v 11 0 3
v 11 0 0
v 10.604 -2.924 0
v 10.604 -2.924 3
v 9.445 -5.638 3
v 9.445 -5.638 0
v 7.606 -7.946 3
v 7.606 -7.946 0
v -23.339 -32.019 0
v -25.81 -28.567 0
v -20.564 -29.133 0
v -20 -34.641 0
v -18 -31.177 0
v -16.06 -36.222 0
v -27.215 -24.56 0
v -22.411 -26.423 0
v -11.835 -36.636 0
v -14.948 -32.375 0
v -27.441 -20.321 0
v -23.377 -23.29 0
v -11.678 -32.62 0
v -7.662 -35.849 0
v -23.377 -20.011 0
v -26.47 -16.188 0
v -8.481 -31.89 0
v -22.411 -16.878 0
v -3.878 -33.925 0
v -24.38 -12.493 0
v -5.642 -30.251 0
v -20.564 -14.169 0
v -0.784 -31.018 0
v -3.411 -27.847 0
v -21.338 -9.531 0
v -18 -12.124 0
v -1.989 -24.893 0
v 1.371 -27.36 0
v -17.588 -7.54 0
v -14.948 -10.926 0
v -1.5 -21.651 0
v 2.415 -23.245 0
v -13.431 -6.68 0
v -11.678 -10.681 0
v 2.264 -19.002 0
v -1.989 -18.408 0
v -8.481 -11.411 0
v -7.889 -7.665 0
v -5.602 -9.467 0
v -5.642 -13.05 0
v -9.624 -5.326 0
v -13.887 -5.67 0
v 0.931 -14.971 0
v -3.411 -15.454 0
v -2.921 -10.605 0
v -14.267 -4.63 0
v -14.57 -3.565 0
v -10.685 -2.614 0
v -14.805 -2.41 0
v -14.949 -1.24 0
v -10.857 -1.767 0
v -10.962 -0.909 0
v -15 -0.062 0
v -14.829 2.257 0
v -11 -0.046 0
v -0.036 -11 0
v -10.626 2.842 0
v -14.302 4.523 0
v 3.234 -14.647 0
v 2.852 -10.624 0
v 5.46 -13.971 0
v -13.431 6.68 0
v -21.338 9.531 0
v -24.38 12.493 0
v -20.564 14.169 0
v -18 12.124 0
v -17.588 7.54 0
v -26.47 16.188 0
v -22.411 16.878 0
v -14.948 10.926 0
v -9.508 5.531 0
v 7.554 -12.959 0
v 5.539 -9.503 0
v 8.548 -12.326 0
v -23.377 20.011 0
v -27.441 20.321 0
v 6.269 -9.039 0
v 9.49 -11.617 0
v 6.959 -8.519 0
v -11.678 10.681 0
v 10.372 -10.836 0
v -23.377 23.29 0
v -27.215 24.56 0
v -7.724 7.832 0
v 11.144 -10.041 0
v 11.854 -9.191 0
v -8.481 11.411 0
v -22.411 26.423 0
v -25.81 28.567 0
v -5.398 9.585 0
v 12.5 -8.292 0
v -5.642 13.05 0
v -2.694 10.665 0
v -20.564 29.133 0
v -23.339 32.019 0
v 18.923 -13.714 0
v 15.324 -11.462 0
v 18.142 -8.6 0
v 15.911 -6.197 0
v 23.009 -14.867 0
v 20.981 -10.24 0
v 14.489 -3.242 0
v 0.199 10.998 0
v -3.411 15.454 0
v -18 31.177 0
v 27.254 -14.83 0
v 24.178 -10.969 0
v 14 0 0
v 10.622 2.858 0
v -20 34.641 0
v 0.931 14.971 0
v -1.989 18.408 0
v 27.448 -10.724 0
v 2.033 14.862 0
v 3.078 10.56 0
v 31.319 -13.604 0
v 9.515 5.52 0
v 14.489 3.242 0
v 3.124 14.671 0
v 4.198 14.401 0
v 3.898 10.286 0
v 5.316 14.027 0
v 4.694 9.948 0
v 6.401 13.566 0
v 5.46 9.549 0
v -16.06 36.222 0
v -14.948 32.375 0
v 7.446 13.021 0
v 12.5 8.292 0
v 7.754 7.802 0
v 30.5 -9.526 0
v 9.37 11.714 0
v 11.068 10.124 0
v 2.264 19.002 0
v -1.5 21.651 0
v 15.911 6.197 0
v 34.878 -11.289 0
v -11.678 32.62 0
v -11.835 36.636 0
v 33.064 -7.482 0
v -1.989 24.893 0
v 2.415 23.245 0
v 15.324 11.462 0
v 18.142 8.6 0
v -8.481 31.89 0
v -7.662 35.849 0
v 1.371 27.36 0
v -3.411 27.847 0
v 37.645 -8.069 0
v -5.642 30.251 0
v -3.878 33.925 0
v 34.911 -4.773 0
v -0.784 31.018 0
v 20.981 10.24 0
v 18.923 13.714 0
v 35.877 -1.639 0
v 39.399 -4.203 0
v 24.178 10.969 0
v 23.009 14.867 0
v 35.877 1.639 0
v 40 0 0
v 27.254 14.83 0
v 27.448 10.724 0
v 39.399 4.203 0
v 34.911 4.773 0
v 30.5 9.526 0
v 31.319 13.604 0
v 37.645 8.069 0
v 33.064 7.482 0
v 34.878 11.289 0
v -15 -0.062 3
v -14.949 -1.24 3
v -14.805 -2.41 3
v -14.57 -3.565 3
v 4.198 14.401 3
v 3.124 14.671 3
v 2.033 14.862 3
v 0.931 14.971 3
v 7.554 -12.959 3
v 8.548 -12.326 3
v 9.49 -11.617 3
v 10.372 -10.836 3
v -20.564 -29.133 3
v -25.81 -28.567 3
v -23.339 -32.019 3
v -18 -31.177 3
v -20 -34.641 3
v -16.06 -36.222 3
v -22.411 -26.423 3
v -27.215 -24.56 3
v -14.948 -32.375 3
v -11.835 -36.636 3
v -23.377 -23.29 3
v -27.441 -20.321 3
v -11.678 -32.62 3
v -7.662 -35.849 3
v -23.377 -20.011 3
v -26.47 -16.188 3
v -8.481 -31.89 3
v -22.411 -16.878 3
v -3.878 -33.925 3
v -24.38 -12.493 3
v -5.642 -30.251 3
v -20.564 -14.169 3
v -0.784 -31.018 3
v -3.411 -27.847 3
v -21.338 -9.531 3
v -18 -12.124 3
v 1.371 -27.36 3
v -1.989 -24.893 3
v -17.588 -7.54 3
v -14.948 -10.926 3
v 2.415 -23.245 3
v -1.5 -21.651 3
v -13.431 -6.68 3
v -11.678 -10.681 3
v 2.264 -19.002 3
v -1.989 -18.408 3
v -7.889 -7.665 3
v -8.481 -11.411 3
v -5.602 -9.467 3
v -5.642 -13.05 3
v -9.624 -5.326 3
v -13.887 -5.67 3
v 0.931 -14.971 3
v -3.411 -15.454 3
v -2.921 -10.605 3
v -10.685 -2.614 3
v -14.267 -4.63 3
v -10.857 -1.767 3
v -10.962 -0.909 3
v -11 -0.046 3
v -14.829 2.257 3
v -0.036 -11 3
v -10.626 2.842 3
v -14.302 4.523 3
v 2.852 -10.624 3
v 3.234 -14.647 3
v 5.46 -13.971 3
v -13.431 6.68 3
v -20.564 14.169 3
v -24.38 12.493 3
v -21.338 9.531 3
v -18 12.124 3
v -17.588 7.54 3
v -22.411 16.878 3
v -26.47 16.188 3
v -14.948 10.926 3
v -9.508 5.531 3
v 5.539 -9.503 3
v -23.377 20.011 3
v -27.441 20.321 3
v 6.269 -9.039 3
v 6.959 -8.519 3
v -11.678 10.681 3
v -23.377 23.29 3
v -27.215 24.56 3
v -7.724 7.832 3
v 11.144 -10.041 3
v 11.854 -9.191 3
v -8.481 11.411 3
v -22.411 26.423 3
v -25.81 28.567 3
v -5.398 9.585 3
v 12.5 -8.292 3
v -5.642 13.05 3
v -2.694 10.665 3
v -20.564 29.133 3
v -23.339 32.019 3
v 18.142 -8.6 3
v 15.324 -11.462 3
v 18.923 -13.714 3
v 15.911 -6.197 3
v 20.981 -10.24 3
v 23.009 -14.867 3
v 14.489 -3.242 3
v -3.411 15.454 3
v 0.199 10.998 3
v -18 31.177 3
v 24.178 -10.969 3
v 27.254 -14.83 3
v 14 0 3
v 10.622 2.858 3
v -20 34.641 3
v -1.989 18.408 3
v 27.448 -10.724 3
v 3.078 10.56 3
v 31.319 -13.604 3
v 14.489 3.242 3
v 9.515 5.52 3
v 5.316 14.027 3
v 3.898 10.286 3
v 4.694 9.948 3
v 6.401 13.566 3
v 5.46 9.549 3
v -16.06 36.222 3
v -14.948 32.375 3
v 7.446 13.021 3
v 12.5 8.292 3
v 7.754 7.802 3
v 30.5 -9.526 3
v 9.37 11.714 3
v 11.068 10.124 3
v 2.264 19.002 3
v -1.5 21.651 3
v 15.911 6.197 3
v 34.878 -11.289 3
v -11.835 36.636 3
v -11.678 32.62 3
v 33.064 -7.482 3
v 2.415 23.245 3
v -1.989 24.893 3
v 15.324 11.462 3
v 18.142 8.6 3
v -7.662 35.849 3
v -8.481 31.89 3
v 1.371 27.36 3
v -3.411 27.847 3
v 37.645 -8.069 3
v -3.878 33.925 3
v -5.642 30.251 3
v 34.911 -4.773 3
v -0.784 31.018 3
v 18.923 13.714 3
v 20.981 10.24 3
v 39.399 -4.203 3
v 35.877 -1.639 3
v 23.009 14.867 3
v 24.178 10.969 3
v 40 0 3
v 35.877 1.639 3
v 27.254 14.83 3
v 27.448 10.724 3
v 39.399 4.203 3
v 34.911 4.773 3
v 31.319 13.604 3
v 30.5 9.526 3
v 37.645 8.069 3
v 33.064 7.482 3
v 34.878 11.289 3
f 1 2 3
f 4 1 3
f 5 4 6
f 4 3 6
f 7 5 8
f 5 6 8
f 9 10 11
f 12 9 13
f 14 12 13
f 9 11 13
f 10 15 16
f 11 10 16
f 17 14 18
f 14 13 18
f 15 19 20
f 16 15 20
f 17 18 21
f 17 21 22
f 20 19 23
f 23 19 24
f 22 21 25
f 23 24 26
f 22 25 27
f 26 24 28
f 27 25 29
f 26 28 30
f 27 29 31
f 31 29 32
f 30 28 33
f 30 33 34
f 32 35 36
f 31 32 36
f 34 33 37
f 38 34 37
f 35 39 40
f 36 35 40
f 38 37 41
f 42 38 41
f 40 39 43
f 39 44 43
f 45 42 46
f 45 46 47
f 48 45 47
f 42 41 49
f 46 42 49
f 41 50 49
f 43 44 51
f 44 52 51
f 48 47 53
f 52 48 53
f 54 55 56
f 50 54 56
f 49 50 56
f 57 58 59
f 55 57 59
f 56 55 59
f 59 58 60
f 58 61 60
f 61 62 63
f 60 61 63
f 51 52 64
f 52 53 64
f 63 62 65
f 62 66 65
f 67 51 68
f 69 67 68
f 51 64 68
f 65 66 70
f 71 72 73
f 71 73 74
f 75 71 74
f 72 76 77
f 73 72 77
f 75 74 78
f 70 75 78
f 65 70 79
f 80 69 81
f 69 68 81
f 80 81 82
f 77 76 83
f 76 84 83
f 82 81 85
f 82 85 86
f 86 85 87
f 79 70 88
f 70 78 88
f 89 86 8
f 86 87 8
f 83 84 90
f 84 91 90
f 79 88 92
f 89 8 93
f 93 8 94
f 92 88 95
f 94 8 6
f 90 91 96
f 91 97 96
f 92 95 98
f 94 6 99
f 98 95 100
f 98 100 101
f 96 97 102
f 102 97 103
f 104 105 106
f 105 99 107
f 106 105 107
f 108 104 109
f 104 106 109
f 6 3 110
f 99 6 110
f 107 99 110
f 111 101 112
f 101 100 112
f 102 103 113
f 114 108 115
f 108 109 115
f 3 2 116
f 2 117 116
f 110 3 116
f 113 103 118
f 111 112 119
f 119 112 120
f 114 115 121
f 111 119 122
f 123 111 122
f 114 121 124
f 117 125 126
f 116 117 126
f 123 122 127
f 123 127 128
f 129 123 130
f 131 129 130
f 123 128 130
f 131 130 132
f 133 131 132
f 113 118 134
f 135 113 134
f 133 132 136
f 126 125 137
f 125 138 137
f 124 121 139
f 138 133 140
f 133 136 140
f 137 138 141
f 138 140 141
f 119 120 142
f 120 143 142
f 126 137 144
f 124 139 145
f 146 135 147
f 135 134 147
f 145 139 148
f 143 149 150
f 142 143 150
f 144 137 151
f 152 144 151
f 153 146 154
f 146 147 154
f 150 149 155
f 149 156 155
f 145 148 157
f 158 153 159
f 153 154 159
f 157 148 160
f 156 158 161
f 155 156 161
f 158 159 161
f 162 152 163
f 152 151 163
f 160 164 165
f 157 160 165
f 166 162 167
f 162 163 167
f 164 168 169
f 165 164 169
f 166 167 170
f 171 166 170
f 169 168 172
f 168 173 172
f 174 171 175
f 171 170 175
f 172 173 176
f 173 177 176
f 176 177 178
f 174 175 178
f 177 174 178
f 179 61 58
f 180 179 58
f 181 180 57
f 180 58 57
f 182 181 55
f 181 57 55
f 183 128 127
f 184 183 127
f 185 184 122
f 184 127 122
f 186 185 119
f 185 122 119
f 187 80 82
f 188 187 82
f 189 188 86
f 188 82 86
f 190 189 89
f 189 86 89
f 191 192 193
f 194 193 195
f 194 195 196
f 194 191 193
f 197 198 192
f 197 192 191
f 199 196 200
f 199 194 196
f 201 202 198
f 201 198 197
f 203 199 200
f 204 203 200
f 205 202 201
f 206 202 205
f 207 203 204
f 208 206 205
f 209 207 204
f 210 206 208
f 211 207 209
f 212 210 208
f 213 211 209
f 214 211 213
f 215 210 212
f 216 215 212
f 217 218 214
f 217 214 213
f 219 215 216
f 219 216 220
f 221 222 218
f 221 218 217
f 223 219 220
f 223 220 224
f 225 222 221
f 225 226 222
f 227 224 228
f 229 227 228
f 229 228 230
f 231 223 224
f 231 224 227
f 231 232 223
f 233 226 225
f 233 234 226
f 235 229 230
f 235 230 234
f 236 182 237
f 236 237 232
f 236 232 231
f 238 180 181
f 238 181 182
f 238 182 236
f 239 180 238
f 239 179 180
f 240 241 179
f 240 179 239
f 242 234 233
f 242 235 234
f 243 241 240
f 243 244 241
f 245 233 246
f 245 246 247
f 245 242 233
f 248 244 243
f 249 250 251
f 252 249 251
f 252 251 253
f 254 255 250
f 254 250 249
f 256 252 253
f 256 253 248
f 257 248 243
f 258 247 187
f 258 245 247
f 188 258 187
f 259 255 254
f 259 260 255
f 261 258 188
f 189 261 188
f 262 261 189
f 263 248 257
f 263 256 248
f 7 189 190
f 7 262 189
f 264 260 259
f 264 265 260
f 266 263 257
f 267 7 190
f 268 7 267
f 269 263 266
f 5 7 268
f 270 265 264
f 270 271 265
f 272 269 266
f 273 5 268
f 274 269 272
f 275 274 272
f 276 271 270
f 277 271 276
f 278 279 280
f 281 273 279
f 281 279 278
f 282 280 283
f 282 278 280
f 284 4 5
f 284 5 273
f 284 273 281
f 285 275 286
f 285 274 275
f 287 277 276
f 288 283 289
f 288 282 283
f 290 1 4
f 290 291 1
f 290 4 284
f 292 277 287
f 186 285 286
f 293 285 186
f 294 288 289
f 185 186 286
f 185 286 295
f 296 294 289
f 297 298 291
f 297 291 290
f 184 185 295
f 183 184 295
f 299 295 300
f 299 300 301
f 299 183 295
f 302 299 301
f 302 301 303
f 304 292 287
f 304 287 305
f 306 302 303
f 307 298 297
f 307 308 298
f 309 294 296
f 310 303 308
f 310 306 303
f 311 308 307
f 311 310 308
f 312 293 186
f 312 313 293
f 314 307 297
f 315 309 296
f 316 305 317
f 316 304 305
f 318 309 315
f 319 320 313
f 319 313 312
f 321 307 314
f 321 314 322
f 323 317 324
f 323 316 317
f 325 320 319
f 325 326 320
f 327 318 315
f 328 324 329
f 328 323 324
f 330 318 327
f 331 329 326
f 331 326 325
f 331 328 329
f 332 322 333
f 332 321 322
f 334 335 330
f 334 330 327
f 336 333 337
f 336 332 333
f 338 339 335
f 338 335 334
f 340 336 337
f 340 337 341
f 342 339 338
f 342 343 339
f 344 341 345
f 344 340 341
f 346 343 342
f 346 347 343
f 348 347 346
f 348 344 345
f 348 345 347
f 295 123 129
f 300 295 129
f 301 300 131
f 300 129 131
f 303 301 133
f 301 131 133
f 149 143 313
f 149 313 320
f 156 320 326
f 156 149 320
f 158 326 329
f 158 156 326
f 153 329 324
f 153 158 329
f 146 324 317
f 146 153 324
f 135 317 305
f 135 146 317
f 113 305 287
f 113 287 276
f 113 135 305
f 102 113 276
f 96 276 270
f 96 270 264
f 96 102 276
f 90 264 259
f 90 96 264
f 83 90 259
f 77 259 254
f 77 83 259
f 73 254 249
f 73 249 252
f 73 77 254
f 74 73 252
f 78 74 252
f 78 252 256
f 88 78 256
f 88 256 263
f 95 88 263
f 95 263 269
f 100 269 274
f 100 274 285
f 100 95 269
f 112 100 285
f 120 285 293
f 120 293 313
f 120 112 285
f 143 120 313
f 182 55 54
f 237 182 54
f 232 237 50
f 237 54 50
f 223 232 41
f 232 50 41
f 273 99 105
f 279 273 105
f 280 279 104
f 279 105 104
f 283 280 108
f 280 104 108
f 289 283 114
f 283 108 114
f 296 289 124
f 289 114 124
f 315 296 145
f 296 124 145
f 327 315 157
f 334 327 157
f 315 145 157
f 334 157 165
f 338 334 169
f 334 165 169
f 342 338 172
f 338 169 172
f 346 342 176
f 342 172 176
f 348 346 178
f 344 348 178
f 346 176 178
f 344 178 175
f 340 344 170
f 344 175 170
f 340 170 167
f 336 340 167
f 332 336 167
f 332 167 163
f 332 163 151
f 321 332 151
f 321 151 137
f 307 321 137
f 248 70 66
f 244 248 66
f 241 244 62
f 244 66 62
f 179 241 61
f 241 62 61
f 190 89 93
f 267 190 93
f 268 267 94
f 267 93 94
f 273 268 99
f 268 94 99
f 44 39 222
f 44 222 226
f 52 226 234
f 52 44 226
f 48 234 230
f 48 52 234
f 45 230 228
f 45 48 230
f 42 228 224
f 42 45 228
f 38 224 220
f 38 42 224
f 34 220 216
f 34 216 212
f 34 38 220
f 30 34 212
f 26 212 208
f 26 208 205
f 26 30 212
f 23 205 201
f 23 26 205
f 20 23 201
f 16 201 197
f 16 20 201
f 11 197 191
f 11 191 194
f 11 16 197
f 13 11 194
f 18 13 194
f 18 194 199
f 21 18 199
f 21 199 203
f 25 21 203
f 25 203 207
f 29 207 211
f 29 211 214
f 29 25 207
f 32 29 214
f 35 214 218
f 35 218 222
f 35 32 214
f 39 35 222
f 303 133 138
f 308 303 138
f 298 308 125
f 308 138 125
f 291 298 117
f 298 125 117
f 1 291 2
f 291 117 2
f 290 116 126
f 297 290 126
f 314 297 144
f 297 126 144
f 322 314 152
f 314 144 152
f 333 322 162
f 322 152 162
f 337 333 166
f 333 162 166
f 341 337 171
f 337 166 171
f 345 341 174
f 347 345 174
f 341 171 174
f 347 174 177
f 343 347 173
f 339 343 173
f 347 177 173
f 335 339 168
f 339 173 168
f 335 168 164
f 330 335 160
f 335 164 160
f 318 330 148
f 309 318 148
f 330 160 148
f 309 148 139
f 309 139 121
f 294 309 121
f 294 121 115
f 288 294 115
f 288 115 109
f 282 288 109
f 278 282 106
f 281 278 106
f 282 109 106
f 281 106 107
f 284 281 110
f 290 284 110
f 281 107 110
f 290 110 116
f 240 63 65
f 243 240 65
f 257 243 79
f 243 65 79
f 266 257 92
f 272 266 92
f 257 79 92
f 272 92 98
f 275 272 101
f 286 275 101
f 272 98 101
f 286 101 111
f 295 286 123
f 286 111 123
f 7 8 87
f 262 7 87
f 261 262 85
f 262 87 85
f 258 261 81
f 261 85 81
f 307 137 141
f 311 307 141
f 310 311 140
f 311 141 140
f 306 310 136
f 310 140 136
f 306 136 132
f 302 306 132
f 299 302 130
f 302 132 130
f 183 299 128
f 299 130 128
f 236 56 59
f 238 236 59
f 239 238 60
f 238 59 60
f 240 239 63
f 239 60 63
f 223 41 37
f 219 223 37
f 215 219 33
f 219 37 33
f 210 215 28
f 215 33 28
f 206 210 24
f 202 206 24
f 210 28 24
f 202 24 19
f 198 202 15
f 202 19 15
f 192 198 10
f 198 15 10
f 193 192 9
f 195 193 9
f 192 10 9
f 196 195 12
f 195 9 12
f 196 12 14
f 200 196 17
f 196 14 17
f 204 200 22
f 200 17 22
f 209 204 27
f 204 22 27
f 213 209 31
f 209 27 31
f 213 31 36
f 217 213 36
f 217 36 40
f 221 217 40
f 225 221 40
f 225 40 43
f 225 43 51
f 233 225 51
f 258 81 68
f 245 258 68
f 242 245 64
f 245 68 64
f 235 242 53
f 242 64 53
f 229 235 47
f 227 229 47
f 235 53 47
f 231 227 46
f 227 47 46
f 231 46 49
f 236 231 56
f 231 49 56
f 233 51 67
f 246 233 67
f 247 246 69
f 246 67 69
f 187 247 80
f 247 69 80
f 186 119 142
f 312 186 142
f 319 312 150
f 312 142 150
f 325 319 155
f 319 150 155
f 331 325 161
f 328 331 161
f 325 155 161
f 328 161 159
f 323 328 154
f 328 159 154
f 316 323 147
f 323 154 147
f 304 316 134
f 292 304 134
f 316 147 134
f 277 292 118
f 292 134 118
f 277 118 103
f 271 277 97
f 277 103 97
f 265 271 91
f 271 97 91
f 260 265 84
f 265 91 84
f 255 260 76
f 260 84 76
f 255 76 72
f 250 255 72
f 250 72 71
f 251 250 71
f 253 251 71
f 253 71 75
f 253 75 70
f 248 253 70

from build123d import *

# Parameters (mm, degrees)
F0_R     = 11
F1_DEPTH = 3


with BuildPart() as f1:
    # F0 (on Top) → F1 (new body)
    with BuildSketch(Plane.XY):
        with BuildLine():
            ThreePointArc((0.930703, -14.971099), (4.359901, -14.352396), (7.553815, -12.959162))
            ThreePointArc((7.553815, -12.959162), (9.025781, -11.980621), (10.37242, -10.835723))
            ThreePointArc((10.37242, -10.835723), (11.506741, -9.622625), (12.5, -8.291562))
            ThreePointArc((12.5, -8.291562), (40, 0), (12.5, 8.291562))
            ThreePointArc((12.5, 8.291562), (10.249589, 10.951983), (7.446056, 13.021377))
            ThreePointArc((7.446056, 13.021377), (5.862631, 13.806866), (4.197801, 14.400641))
            ThreePointArc((4.197801, 14.400641), (2.580067, 14.776443), (0.930703, 14.971099))
            ThreePointArc((0.930703, 14.971099), (-20, 34.641016), (-13.430703, 6.679537))
            ThreePointArc((-13.430703, 6.679537), (-14.60949, 3.400413), (-14.999871, -0.062215))
            ThreePointArc((-14.999871, -0.062215), (-14.888413, -1.826246), (-14.570222, -3.564918))
            ThreePointArc((-14.570222, -3.564918), (-14.086808, -5.153818), (-13.430703, -6.679537))
            ThreePointArc((-13.430703, -6.679537), (-20, -34.641016), (0.930703, -14.971099))
        make_face()
        with Locations((-12.5, -21.650635)):
            Circle(F0_R, mode=Mode.SUBTRACT)
        with BuildLine():
            ThreePointArc((7.606442, -7.946197), (6.618906, -8.785788), (5.539465, -9.503385))
            ThreePointArc((5.539465, -9.503385), (-4.299263, -10.125035), (-10.684829, -2.614273))
            ThreePointArc((-10.684829, -2.614273), (-10.918169, -1.339247), (-10.999905, -0.045624))
            ThreePointArc((-10.999905, -0.045624), (-6.618906, 8.785788), (3.078388, 10.56047))
            ThreePointArc((3.078388, 10.56047), (4.299263, 10.125035), (5.460441, 9.54901))
            ThreePointArc((5.460441, 9.54901), (9.514853, 5.519744), (11, 0))
            ThreePointArc((11, 0), (10.116097, -4.320251), (7.606442, -7.946197))
        make_face(mode=Mode.SUBTRACT)
        with BuildLine():
            ThreePointArc((36, 0), (25, -11), (14, 0))
            ThreePointArc((14, 0), (25, 11), (36, 0))
        make_face(mode=Mode.SUBTRACT)
        with Locations((-12.5, 21.650635)):
            Circle(F0_R, mode=Mode.SUBTRACT)
    extrude(amount=F1_DEPTH)


solid = f1.part
